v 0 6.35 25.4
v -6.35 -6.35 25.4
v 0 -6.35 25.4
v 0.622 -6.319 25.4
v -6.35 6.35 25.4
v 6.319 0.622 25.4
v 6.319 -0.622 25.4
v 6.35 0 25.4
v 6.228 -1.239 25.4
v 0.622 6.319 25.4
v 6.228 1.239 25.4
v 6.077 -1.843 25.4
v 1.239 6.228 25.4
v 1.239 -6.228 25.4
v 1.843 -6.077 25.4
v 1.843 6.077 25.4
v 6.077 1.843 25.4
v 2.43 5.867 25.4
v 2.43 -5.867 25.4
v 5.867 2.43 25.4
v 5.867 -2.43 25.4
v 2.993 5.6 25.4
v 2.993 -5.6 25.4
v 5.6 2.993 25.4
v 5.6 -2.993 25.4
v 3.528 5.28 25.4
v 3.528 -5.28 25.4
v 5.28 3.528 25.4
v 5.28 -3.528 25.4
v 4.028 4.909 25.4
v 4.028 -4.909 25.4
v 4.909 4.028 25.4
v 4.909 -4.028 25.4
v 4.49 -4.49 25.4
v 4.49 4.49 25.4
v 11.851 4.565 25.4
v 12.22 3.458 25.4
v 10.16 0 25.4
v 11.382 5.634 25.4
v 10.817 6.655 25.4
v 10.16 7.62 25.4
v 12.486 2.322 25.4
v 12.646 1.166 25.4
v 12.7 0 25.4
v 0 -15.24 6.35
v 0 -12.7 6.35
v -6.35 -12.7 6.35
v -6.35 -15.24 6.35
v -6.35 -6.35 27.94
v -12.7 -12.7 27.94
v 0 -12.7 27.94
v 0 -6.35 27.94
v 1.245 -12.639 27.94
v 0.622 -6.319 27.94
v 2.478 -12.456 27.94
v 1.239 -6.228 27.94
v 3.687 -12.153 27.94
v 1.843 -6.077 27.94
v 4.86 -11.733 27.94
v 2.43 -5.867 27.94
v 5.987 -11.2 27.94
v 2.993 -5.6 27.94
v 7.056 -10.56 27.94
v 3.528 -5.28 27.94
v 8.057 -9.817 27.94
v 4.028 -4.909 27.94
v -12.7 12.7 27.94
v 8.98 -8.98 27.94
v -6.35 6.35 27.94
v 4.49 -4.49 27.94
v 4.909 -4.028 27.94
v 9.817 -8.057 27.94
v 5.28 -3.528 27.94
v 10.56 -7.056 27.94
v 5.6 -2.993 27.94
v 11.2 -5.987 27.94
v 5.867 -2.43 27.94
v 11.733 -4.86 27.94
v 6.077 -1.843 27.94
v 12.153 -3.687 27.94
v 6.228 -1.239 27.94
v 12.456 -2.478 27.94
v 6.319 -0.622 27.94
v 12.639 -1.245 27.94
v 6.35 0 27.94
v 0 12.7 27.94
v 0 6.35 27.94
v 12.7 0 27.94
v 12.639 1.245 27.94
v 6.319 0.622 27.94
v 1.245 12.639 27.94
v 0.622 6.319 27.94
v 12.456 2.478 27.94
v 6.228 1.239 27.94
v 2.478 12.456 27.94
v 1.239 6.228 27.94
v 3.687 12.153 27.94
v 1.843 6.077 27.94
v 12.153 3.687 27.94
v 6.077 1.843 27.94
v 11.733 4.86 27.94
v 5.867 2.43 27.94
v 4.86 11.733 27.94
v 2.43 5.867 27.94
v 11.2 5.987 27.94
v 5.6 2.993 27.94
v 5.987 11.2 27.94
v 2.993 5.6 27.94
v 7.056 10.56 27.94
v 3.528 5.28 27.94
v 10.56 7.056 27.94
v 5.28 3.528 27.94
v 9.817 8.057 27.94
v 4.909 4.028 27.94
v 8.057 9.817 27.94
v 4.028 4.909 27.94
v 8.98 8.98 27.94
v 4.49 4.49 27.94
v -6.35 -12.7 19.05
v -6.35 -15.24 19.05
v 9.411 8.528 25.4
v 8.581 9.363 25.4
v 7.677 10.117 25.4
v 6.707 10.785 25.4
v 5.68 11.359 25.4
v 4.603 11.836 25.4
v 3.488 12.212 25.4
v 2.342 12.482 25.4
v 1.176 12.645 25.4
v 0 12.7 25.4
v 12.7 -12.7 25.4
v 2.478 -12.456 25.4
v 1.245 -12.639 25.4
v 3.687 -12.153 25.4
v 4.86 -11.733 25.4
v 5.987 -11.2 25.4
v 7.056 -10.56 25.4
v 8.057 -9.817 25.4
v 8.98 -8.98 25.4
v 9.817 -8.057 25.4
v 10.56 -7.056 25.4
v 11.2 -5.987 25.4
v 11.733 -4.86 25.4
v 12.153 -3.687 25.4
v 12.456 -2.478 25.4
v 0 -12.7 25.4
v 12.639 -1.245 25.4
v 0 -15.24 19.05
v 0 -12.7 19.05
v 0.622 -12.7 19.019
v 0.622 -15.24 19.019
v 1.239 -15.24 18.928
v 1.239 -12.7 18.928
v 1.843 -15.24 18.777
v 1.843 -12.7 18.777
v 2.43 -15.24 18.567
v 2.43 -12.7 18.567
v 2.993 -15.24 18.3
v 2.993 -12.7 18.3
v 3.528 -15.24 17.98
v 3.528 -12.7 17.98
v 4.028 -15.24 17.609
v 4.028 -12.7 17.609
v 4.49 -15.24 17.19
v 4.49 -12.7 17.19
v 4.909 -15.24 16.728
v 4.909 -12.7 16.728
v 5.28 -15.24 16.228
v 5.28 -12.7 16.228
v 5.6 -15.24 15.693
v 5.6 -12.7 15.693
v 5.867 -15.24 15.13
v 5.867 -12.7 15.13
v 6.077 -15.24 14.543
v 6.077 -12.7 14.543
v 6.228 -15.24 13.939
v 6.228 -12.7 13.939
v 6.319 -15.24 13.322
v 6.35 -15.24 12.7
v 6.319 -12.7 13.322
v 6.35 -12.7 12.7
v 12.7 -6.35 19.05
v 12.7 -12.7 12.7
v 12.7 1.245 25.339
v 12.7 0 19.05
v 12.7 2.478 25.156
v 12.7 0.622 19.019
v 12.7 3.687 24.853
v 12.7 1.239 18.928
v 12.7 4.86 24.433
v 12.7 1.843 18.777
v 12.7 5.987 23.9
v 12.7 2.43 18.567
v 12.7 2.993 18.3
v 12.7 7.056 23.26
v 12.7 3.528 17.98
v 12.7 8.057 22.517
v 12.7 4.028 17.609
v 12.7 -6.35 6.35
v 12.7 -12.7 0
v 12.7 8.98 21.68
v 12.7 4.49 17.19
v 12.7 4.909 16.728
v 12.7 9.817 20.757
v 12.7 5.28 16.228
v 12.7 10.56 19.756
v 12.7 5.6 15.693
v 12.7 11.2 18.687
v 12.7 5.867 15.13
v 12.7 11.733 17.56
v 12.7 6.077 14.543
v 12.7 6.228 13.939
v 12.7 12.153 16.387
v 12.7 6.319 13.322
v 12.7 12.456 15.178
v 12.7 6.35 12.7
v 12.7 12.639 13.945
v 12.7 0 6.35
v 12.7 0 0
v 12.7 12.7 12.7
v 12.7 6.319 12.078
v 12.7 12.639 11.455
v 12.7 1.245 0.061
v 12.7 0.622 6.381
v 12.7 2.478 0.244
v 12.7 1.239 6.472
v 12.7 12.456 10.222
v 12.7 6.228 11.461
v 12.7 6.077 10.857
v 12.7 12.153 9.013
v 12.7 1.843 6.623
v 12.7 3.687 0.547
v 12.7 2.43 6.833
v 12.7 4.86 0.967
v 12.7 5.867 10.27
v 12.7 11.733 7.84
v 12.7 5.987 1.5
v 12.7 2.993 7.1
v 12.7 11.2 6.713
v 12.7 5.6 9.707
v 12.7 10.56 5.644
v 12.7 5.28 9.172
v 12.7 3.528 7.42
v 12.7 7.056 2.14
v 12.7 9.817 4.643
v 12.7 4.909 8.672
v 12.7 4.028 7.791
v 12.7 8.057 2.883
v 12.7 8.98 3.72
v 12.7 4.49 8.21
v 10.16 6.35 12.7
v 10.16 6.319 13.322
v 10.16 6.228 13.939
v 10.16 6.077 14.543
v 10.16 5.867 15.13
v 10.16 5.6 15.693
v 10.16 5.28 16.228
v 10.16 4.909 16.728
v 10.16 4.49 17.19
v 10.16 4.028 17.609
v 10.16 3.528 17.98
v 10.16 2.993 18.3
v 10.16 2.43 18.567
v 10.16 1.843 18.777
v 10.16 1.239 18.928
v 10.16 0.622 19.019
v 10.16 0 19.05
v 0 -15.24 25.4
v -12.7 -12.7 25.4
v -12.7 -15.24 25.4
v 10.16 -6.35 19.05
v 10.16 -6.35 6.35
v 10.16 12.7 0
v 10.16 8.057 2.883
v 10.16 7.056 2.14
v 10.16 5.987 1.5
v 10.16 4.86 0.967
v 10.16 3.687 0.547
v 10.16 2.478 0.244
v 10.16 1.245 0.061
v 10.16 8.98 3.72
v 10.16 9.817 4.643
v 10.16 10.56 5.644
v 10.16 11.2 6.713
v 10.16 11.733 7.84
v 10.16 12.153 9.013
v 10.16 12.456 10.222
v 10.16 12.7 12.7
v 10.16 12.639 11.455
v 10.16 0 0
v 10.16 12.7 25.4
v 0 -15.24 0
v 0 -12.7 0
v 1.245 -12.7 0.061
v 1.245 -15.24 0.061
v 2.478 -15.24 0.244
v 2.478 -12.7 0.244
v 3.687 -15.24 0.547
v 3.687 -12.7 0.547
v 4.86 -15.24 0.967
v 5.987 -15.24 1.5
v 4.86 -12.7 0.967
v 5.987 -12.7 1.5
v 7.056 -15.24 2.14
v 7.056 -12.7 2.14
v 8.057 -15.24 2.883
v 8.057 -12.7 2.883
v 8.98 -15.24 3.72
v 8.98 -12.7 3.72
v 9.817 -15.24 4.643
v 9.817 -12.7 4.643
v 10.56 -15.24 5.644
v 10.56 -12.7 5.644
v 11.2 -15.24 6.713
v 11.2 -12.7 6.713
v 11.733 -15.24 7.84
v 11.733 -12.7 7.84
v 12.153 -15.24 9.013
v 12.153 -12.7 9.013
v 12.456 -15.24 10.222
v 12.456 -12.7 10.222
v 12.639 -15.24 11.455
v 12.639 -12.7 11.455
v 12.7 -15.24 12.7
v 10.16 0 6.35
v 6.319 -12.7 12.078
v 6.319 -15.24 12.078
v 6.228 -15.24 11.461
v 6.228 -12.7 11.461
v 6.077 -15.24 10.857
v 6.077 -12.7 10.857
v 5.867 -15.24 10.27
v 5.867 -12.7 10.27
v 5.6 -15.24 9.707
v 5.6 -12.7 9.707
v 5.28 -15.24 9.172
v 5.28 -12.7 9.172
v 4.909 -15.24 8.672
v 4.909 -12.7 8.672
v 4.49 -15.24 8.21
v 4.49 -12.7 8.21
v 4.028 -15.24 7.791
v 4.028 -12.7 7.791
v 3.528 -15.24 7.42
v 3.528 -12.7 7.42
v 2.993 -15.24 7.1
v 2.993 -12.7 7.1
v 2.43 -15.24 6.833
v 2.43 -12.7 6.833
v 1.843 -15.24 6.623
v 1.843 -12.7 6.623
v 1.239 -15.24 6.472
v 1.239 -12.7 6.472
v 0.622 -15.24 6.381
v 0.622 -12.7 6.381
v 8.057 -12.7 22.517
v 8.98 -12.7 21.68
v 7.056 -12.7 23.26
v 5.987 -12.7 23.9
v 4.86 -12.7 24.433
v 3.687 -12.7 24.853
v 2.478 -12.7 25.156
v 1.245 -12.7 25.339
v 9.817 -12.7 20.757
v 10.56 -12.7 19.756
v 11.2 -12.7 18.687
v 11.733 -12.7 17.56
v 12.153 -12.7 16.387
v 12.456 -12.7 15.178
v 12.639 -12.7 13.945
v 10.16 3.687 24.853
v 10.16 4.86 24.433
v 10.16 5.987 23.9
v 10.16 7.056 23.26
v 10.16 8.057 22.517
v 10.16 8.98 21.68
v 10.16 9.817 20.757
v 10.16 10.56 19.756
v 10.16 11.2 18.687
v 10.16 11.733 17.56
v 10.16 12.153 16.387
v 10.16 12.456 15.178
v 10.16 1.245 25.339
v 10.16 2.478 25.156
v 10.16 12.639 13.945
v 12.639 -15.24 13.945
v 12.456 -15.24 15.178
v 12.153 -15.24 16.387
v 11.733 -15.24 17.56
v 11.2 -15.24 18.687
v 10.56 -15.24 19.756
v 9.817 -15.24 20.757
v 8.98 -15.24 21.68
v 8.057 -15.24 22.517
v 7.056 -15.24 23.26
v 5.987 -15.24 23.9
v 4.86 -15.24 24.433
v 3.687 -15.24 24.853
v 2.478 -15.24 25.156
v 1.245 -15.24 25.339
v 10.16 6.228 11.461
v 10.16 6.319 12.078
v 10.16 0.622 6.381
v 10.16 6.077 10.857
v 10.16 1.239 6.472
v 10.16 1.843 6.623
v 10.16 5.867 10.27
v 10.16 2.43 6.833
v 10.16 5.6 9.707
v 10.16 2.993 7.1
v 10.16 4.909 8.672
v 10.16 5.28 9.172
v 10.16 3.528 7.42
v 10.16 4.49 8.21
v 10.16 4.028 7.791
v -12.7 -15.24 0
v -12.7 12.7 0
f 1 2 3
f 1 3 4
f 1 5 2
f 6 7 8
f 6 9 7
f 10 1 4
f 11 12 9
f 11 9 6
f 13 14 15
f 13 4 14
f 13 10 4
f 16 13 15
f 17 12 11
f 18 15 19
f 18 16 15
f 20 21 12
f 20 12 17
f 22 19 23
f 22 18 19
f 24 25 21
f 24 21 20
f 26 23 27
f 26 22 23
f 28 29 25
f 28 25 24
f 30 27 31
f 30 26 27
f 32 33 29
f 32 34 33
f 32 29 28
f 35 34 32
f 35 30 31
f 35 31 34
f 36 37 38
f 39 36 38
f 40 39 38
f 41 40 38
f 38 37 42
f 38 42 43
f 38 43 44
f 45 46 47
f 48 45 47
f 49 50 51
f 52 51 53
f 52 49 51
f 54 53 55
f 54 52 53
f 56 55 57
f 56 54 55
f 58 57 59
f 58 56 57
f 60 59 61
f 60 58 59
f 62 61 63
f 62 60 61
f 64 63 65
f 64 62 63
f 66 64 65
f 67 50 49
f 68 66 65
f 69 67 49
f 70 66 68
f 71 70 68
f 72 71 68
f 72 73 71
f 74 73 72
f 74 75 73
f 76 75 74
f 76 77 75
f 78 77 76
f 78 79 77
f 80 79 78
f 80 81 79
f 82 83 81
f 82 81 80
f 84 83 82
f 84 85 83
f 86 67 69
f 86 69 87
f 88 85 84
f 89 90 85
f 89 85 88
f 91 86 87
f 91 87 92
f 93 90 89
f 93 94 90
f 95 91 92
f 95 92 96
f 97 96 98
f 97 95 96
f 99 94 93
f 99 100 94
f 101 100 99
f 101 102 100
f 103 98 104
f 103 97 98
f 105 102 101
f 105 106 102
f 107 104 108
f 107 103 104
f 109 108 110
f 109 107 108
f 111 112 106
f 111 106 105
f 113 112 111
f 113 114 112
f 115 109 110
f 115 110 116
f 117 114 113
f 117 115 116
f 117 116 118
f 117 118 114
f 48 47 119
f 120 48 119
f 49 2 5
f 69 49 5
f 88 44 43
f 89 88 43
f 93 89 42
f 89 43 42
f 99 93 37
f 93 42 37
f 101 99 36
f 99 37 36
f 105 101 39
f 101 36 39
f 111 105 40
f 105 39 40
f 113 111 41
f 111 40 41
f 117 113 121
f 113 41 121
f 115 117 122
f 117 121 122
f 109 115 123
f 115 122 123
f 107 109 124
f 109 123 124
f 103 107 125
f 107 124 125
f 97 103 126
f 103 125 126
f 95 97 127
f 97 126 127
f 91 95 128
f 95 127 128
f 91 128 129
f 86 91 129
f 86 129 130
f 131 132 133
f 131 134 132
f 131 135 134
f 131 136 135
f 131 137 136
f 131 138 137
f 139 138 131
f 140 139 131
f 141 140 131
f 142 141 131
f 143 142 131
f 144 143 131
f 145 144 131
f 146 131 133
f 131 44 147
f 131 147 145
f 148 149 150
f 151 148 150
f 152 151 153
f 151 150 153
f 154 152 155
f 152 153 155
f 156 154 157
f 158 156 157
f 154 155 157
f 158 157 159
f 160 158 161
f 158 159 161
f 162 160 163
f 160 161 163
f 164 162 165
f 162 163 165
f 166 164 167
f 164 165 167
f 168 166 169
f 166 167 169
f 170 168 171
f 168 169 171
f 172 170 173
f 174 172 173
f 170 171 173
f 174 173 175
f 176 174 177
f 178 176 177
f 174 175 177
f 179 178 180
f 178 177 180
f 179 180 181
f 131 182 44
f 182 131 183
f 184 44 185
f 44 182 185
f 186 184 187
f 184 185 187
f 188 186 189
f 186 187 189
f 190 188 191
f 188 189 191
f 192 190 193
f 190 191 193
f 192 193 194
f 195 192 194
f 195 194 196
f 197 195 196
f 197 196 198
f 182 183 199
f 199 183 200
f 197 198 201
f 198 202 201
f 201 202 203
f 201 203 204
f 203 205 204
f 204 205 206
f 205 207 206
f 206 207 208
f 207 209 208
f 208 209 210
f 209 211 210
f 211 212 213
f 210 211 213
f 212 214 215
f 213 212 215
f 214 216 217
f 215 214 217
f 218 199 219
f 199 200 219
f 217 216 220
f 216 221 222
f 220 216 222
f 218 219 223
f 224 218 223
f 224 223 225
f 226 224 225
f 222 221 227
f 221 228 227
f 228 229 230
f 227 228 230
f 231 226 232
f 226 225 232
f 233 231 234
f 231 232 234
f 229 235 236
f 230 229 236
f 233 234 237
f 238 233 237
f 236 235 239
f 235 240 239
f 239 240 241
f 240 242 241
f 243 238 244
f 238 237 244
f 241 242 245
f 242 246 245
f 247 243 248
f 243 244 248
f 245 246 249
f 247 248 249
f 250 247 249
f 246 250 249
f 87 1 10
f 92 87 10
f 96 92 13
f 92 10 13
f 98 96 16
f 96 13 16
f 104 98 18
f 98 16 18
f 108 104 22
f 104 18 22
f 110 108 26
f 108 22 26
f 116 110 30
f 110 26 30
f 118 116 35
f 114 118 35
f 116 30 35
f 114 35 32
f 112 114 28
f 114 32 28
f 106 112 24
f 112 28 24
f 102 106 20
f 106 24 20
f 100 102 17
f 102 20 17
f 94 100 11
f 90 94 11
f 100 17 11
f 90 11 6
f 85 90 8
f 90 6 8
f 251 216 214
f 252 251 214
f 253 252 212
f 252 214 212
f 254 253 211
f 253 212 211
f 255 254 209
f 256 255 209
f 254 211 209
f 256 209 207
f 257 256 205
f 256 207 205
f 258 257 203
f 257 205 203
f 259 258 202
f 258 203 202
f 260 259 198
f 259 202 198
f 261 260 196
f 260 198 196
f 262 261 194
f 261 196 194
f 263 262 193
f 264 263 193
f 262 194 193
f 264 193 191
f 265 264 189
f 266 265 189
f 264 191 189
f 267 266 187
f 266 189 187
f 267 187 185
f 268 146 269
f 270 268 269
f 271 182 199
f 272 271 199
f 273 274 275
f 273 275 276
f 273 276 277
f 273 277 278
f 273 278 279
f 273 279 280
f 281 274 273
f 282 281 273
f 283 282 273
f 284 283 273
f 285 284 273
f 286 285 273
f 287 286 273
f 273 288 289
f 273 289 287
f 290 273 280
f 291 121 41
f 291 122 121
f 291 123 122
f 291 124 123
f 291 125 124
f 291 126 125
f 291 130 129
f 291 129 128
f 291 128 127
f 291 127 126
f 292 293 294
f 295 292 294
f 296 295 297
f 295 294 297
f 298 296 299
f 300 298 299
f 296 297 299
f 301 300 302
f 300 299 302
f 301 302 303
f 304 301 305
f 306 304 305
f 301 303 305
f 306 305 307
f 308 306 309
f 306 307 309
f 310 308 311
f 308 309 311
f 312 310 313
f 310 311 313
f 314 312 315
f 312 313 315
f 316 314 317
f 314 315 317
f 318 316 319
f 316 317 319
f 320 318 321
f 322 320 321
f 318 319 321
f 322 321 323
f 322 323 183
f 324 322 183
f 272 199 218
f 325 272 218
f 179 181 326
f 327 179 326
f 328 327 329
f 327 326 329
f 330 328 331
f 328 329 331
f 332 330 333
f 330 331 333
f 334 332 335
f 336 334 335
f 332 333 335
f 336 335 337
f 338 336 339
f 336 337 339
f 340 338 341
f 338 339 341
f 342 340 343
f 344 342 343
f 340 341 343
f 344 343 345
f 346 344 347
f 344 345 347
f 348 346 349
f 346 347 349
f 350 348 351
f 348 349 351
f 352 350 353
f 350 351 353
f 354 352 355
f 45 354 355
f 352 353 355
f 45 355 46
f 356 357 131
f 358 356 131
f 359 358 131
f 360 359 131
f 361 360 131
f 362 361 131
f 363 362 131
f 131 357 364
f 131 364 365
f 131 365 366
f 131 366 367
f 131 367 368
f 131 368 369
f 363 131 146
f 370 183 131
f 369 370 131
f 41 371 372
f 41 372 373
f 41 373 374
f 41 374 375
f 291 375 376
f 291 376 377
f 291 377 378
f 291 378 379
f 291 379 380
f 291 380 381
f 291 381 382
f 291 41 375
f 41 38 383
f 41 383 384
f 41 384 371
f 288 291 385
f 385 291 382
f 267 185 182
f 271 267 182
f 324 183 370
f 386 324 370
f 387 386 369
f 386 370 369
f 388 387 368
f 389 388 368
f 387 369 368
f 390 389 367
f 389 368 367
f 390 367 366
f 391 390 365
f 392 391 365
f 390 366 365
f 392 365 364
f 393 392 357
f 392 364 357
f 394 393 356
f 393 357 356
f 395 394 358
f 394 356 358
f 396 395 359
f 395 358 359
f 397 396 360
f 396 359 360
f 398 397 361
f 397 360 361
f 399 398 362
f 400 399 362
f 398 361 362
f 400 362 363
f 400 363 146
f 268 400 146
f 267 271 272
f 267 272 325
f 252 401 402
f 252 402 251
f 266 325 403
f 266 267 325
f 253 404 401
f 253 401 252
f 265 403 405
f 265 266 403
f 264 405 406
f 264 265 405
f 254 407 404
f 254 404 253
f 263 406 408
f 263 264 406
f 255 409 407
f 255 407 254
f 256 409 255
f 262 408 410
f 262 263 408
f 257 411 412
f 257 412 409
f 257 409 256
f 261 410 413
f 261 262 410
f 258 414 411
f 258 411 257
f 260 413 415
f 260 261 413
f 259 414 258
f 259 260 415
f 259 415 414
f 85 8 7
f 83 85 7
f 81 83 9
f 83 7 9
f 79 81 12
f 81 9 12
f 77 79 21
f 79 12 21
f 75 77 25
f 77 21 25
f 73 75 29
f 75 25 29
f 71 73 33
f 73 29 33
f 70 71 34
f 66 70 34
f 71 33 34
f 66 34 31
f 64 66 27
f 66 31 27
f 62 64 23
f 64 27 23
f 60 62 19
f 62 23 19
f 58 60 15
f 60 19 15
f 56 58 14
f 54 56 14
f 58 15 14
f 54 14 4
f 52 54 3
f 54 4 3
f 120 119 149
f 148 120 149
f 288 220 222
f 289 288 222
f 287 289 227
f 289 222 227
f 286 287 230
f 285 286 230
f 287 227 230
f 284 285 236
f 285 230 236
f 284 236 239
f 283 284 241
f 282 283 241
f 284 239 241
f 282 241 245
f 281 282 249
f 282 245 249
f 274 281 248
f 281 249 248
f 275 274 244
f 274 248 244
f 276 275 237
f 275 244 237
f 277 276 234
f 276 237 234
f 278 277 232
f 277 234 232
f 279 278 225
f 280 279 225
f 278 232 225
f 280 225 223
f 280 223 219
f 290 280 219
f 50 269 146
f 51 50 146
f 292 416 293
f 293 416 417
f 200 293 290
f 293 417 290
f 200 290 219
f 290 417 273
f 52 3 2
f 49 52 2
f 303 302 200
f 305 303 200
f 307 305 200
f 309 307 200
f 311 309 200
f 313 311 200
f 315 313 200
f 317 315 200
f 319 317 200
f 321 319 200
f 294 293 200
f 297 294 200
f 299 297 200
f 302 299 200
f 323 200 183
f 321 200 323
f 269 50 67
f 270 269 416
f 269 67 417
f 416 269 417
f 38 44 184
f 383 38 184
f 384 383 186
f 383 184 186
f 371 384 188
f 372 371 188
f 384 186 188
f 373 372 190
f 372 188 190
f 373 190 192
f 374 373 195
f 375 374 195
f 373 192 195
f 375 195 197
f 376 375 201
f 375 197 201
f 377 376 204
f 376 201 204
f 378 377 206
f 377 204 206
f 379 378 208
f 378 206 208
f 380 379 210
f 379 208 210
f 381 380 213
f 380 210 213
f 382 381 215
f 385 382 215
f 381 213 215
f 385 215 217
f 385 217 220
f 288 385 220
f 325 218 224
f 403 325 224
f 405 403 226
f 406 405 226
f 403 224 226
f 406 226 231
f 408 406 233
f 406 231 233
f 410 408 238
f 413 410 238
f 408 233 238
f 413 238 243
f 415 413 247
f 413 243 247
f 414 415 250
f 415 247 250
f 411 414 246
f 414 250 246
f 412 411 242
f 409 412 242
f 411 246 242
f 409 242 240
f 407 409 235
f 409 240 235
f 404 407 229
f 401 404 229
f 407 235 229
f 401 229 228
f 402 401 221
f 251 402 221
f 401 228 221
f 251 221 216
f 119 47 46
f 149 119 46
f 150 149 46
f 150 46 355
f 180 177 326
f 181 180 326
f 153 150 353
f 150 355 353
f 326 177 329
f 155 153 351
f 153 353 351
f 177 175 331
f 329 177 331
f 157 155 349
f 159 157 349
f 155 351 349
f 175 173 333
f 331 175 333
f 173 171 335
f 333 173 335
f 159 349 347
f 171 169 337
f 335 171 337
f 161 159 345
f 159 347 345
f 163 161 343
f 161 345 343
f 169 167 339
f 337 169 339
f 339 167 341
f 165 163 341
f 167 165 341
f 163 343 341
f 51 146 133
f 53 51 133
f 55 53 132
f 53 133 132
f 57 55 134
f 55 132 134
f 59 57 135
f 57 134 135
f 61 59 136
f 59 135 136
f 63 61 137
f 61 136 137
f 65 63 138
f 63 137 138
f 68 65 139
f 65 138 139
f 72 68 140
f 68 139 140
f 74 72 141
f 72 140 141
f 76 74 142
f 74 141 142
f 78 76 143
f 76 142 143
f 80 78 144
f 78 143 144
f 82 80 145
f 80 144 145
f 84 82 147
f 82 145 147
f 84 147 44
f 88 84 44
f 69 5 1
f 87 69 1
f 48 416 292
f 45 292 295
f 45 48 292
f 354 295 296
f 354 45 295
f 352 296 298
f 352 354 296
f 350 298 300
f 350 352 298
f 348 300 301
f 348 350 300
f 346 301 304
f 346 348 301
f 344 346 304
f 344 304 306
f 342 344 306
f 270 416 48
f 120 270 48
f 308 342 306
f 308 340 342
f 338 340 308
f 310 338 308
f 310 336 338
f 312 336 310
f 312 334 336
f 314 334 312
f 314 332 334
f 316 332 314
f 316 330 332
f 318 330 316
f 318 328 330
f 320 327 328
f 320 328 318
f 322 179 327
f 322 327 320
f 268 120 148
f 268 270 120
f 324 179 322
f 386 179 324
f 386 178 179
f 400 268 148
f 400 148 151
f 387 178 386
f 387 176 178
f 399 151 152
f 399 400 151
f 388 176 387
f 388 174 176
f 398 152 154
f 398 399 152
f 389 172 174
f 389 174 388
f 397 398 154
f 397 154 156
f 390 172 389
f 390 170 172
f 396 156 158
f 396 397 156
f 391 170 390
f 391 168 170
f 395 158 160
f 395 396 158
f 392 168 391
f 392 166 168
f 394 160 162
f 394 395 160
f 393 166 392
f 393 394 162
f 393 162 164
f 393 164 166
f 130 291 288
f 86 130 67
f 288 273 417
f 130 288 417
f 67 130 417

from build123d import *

# Parameters (mm, degrees)
F0_W     = 25.4
F0_H     = 25.4
F1_DEPTH = 25.4
F5_DEPTH = 2.54
F6_DEPTH = 2.54
F7_DEPTH = 2.54


with BuildPart() as f1:
    # F0 (on Top) → F1 (new body)
    with BuildSketch(Plane.XY):
        Rectangle(F0_W, F0_H)
    extrude(amount=F1_DEPTH)

    # F2 (on face) → F5 (join)
    with BuildSketch(Plane.XY.offset(25.4)):
        with BuildLine():
            ThreePointArc((12.7, 0), (8.980256, 8.980256), (0, 12.7))
            Line((0, 12.7), (-12.7, 12.7))
            Line((-12.7, 12.7), (-12.7, -12.7))
            Line((-12.7, -12.7), (0, -12.7))
            ThreePointArc((0, -12.7), (8.980256, -8.980256), (12.7, 0))
        make_face()
        with BuildLine():
            Line((-6.35, -6.35), (-6.35, 6.35))
            Line((-6.35, 6.35), (0, 6.35))
            ThreePointArc((0, 6.35), (4.490128, 4.490128), (6.35, 0))
            ThreePointArc((6.35, 0), (4.490128, -4.490128), (0, -6.35))
            Line((0, -6.35), (-6.35, -6.35))
        make_face(mode=Mode.SUBTRACT)
    extrude(amount=F5_DEPTH)

    # F3 (on face) → F6 (join)
    with BuildSketch(Plane.XZ.offset(12.7)):
        with BuildLine():
            Line((-12.7, 25.4), (-12.7, 0))
            Line((-12.7, 0), (0, 0))
            ThreePointArc((0, 0), (8.980256, 3.719744), (12.7, 12.7))
            ThreePointArc((12.7, 12.7), (8.980256, 21.680256), (0, 25.4))
            Line((0, 25.4), (-12.7, 25.4))
        make_face()
        with BuildLine():
            Line((-6.35, 19.05), (0, 19.05))
            ThreePointArc((0, 19.05), (4.490128, 17.190128), (6.35, 12.7))
            ThreePointArc((6.35, 12.7), (4.490128, 8.209872), (0, 6.35))
            Line((0, 6.35), (-6.35, 6.35))
            Line((-6.35, 6.35), (-6.35, 19.05))
        make_face(mode=Mode.SUBTRACT)
    extrude(amount=F6_DEPTH)

    # F4 (on face) → F7 (cut)
    with BuildSketch(Plane.YZ.offset(12.7)):
        with BuildLine():
            Line((0, 19.05), (-6.35, 19.05))
            Line((-6.35, 19.05), (-6.35, 6.35))
            Line((-6.35, 6.35), (0, 6.35))
            ThreePointArc((0, 6.35), (4.490128, 8.209872), (6.35, 12.7))
            ThreePointArc((6.35, 12.7), (4.490128, 17.190128), (0, 19.05))
        make_face()
        with BuildLine():
            Line((12.7, 25.4), (0, 25.4))
            ThreePointArc((0, 25.4), (8.980256, 21.680256), (12.7, 12.7))
            Line((12.7, 12.7), (12.7, 25.4))
        make_face()
        with BuildLine():
            Line((12.7, 0), (12.7, 12.7))
            ThreePointArc((12.7, 12.7), (8.980256, 3.719744), (0, 0))
            Line((0, 0), (12.7, 0))
        make_face()
    extrude(amount=-F7_DEPTH, mode=Mode.SUBTRACT)


solid = f1.part
